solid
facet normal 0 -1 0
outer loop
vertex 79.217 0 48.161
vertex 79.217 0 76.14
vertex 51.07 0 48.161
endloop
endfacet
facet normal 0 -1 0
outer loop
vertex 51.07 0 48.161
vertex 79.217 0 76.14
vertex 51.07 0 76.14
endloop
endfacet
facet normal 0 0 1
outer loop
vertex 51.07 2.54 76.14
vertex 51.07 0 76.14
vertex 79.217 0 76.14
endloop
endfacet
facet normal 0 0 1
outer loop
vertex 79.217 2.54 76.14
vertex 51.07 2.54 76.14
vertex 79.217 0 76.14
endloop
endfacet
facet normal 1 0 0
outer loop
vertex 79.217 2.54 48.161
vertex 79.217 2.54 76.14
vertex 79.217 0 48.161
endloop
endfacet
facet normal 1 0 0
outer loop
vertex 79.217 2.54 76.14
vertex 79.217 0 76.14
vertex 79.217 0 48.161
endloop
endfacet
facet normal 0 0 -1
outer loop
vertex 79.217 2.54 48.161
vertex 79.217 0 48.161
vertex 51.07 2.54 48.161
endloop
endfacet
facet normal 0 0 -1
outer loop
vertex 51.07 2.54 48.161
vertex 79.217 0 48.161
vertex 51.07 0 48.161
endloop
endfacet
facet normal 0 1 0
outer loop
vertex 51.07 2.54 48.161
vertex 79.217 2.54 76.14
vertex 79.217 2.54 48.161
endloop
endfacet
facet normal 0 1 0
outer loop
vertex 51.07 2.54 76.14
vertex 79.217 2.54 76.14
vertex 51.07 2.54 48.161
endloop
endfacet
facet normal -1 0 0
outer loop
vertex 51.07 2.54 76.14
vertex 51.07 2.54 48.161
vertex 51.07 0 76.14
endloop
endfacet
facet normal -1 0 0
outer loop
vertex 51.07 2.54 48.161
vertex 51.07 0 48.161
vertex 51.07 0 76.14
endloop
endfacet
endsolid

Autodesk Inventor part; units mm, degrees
ref_plane "YZ Plane" through (0, 0, 0) normal (1, 0, 0) x (0, 1, 0)
ref_plane "XZ Plane" through (0, 0, 0) normal (0, 1, 0) x (-1, 0, 0)
ref_plane "XY Plane" through (0, 0, 0) normal (0, 0, 1) x (1, 0, 0)
sketch "Sketch1" plane through (0, 0, 0) normal (0, 1, 0) x (-1, 0, 0)
  line L0 (22.3834, 76.1397) -> (-79.2166, 76.1397)
  line L1 (-79.2166, 76.1397) -> (-79.2166, -25.4603)
  line L2 (-79.2166, -25.4603) -> (22.3834, -25.4603)
  line L3 (22.3834, -25.4603) -> (22.3834, 76.1397)
  point P0 (0, 0)
  dimension "d0" = 101.6
  dimension "d1" = 101.6
extrude "Extrusion1" add sketch "Sketch1" along normal blind 2.54
sketch "Sketch2" plane through (0, 0, 0) normal (0, -1, 0) x (1, 0, 0)
  line L0 (-22.3834, 76.1397) -> (79.2166, 76.1397) projected
  line L1 (79.2166, -25.4603) -> (-22.3834, -25.4603) projected
  line L2 (51.0699, 76.1397) -> (-22.3834, 76.1397)
  line L3 (-22.3834, 76.1397) -> (-22.3834, -25.4603)
  line L4 (-22.3834, -25.4603) -> (51.0699, -25.4603)
  line L5 (51.0699, -25.4603) -> (51.0699, 76.1397)
  point P0 (0, 0)
extrude "Extrusion2" cut sketch "Sketch2" against normal blind 25.4
sketch "Sketch3" plane through (0, 0, 0) normal (0, -1, 0) x (1, 0, 0)
  line L0 (79.2166, 76.1397) -> (79.2166, -25.4603) projected
  line L1 (51.0699, -25.4603) -> (51.0699, 76.1397) projected
  line L2 (79.2166, 48.1612) -> (51.0699, 48.1612)
  line L3 (51.0699, 48.1612) -> (51.0699, -25.4603)
  line L4 (51.0699, -25.4603) -> (79.2166, -25.4603)
  line L5 (79.2166, -25.4603) -> (79.2166, 48.1612)
  point P0 (0, 0)
extrude "Extrusion3" cut sketch "Sketch3" against normal blind 25.4
equation "\"d1\" = d0"
properties part number "motor holder"
